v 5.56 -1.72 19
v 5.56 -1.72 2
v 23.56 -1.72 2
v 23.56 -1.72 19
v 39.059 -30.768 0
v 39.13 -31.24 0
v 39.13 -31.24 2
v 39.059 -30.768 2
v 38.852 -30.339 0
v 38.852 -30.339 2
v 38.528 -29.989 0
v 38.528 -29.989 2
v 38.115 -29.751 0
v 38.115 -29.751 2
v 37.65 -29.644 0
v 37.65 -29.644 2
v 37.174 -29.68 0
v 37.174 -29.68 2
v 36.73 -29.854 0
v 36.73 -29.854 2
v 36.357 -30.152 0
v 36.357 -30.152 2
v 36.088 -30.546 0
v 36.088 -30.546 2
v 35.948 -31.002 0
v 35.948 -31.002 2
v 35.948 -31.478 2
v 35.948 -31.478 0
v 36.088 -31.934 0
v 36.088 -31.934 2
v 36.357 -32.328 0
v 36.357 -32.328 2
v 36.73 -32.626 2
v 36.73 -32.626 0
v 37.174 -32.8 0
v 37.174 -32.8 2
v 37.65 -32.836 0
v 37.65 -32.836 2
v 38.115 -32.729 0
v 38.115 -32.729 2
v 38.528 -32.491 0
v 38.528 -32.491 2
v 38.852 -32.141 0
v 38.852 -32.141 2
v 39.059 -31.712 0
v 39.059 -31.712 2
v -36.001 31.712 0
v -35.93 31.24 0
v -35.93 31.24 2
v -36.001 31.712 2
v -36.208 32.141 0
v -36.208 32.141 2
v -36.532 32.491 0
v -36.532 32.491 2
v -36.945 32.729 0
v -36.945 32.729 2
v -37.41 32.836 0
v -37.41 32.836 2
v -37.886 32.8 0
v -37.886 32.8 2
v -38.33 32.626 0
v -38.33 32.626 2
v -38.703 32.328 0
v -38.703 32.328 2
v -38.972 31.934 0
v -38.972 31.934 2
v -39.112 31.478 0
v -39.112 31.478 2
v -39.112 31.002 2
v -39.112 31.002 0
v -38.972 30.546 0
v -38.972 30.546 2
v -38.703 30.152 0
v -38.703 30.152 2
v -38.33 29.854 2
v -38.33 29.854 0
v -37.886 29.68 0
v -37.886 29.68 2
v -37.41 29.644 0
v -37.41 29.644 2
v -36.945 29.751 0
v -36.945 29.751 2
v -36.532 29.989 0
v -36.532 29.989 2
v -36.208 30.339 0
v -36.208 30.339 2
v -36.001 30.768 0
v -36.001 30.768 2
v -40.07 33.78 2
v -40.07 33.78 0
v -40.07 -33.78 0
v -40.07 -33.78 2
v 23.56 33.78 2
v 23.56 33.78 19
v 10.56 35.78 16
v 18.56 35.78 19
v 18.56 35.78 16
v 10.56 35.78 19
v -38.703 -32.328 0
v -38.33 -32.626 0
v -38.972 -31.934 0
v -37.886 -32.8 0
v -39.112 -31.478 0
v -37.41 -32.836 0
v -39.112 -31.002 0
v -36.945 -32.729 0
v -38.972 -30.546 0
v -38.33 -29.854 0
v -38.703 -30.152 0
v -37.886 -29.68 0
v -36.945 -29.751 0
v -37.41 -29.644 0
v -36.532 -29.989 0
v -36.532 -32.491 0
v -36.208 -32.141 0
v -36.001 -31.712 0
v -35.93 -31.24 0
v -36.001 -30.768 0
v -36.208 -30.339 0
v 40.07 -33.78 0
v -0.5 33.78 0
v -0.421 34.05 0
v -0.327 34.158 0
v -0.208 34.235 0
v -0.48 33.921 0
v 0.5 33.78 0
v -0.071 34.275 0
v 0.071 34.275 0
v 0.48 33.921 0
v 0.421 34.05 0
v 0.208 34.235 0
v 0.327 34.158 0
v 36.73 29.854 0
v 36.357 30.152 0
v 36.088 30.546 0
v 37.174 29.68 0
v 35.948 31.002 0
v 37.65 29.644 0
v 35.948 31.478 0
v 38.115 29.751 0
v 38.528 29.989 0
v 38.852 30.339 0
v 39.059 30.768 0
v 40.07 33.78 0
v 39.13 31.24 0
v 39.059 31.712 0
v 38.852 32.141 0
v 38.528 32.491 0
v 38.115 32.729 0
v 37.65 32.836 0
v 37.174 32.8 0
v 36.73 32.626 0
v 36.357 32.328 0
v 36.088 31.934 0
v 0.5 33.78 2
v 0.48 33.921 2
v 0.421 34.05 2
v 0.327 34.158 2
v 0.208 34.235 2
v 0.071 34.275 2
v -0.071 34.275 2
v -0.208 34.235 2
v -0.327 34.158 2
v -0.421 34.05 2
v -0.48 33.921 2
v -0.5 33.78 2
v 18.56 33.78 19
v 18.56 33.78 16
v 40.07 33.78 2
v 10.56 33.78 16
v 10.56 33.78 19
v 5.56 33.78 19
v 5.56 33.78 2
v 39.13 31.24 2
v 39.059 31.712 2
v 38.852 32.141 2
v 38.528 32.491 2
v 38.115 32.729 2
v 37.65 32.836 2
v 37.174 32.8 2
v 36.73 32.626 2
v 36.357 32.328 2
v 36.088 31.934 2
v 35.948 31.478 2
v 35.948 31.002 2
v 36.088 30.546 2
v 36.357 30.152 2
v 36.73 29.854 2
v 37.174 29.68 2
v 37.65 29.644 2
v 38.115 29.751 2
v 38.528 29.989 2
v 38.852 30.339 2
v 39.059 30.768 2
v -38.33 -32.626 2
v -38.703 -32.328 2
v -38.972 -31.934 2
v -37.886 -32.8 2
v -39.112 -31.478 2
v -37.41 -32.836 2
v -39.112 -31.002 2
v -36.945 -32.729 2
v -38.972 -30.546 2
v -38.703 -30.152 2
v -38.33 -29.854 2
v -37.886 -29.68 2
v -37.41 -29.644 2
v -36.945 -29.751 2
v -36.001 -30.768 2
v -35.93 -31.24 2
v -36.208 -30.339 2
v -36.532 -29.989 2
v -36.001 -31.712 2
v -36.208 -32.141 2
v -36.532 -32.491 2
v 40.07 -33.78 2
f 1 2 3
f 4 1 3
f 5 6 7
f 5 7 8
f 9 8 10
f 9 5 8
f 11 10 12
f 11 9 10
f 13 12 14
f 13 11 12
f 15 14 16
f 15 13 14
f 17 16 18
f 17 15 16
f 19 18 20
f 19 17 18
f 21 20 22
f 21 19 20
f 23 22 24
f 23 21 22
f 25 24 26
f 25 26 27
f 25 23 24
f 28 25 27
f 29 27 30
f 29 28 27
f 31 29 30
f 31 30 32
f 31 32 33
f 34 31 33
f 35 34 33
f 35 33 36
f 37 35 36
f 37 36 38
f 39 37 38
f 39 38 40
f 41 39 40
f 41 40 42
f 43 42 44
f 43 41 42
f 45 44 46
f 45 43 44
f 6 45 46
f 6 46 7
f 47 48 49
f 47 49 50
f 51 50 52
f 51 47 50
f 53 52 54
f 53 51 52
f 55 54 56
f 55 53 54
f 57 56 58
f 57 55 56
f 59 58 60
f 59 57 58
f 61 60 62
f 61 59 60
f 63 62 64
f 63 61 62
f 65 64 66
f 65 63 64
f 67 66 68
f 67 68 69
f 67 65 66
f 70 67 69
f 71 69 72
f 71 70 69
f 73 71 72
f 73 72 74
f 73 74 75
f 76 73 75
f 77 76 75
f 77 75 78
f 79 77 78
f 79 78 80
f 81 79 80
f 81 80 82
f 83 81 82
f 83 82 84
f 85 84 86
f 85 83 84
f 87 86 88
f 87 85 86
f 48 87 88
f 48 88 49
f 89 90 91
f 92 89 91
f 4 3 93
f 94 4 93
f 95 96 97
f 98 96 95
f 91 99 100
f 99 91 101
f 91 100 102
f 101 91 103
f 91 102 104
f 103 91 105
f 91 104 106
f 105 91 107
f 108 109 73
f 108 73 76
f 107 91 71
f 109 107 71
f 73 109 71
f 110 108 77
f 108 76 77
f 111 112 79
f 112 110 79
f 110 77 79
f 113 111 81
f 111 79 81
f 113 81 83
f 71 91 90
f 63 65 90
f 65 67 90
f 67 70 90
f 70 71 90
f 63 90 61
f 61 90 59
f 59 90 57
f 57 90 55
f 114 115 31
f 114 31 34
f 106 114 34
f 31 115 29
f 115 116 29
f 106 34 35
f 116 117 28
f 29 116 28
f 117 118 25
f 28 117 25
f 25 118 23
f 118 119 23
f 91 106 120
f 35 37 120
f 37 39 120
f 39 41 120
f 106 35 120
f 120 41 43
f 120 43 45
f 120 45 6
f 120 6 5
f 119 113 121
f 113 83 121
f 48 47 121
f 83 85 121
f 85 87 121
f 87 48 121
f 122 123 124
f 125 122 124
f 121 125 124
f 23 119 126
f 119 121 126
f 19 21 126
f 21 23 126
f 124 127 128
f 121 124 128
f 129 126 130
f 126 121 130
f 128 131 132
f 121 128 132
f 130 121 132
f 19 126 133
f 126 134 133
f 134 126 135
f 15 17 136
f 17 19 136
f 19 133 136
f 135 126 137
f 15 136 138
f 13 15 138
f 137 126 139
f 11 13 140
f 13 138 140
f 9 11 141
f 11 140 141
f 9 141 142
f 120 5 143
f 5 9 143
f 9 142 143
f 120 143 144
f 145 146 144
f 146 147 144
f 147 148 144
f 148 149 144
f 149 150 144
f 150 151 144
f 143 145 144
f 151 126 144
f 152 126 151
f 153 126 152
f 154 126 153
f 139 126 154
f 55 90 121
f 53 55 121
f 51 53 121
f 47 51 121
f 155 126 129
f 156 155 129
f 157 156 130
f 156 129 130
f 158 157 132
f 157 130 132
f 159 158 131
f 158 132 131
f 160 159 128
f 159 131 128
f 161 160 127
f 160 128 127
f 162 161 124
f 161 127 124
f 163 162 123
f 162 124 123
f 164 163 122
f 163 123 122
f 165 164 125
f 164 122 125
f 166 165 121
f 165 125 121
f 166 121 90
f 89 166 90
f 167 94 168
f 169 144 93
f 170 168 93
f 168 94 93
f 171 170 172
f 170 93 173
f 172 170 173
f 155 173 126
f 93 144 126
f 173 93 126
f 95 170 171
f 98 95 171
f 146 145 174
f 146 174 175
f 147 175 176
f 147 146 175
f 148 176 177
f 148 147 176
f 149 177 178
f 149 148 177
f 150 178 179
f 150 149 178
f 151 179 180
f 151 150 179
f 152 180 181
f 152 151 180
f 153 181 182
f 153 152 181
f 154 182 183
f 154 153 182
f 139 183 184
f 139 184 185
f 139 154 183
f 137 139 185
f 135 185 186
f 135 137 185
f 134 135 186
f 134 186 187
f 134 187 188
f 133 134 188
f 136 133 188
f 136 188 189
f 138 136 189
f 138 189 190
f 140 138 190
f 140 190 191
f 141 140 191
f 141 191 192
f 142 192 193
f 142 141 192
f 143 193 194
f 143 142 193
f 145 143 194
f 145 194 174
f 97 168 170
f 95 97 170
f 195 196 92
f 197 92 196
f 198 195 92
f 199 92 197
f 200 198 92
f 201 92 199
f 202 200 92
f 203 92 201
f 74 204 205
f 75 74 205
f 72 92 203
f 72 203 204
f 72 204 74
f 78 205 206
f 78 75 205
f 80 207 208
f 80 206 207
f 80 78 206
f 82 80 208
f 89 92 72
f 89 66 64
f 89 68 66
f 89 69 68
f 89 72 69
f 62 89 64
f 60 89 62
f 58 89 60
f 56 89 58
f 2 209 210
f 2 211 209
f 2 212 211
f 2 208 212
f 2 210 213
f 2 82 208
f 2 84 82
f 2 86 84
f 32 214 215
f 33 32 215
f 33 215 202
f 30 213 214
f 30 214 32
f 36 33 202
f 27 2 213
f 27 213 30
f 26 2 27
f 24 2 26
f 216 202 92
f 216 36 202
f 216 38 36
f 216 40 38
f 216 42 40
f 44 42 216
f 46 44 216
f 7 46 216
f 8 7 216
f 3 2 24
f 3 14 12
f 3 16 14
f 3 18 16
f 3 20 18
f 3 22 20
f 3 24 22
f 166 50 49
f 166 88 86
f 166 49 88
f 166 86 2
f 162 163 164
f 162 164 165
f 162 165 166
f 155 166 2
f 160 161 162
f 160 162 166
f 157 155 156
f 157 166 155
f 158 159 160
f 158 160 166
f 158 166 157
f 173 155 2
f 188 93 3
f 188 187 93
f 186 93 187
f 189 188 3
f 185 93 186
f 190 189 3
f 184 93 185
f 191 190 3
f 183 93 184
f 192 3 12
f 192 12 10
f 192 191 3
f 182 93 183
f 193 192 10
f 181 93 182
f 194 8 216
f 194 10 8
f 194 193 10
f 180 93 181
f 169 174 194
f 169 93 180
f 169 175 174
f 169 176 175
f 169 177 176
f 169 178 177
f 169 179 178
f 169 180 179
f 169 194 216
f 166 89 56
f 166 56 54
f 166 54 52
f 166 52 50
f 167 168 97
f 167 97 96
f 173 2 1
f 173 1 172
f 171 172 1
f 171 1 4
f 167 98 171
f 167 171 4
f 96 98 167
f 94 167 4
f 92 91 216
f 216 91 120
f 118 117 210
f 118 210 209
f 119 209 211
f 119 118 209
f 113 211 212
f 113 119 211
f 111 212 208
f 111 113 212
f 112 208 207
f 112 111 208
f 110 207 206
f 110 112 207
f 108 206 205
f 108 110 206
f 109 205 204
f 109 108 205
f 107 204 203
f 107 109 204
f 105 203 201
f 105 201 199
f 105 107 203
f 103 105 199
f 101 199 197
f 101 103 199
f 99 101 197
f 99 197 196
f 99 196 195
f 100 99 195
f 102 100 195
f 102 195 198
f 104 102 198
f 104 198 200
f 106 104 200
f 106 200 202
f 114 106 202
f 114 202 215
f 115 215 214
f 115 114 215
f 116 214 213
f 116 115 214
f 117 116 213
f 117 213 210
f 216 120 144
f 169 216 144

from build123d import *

# Parameters (mm, degrees)
F0_R     = 1.6
F1_DEPTH = 2
F3_W     = 18
F3_H     = 35.5
F4_DEPTH = 17
F6_W     = 8
F6_H     = 3
F7_DEPTH = 2


with BuildPart() as f1:
    # F0 (on Top) → F1 (new body)
    with BuildSketch(Plane.XY):
        with BuildLine():
            Line((-40.07, -33.78), (40.07, -33.78))
            Line((40.07, -33.78), (40.07, 33.78))
            Line((40.07, 33.78), (0.5, 33.78))
            ThreePointArc((0.5, 33.78), (0, 33.28), (-0.5, 33.78))
            Line((-0.5, 33.78), (-40.07, 33.78))
            Line((-40.07, 33.78), (-40.07, -33.78))
        make_face()
        with Locations((-37.53, -31.24)):
            Circle(F0_R, mode=Mode.SUBTRACT)
        with Locations((37.53, -31.24)):
            Circle(F0_R, mode=Mode.SUBTRACT)
        with Locations((-37.53, 31.24)):
            Circle(F0_R, mode=Mode.SUBTRACT)
        with Locations((37.53, 31.24)):
            Circle(F0_R, mode=Mode.SUBTRACT)
        with BuildLine():
            ThreePointArc((-0.5, 33.78), (0, 33.28), (0.5, 33.78))
            Line((0.5, 33.78), (-0.5, 33.78))
        make_face()
        with BuildLine():
            Line((-0.5, 33.78), (0.5, 33.78))
            ThreePointArc((0.5, 33.78), (0, 34.28), (-0.5, 33.78))
        make_face()
    extrude(amount=F1_DEPTH)

    # F3 (on offset) → F4 (join)
    with BuildSketch(Plane.XY.offset(2)):
        with Locations((14.56, 16.03)):
            Rectangle(F3_W, F3_H)
    extrude(amount=F4_DEPTH)

    # F6 (on offset) → F7 (join)
    with BuildSketch(Plane(origin=(0, 33.78, 0), x_dir=(-1, 0, 0), z_dir=(0, 1, 0))):
        with Locations((-14.56, 17.5)):
            Rectangle(F6_W, F6_H)
    extrude(amount=F7_DEPTH)


solid = f1.part
